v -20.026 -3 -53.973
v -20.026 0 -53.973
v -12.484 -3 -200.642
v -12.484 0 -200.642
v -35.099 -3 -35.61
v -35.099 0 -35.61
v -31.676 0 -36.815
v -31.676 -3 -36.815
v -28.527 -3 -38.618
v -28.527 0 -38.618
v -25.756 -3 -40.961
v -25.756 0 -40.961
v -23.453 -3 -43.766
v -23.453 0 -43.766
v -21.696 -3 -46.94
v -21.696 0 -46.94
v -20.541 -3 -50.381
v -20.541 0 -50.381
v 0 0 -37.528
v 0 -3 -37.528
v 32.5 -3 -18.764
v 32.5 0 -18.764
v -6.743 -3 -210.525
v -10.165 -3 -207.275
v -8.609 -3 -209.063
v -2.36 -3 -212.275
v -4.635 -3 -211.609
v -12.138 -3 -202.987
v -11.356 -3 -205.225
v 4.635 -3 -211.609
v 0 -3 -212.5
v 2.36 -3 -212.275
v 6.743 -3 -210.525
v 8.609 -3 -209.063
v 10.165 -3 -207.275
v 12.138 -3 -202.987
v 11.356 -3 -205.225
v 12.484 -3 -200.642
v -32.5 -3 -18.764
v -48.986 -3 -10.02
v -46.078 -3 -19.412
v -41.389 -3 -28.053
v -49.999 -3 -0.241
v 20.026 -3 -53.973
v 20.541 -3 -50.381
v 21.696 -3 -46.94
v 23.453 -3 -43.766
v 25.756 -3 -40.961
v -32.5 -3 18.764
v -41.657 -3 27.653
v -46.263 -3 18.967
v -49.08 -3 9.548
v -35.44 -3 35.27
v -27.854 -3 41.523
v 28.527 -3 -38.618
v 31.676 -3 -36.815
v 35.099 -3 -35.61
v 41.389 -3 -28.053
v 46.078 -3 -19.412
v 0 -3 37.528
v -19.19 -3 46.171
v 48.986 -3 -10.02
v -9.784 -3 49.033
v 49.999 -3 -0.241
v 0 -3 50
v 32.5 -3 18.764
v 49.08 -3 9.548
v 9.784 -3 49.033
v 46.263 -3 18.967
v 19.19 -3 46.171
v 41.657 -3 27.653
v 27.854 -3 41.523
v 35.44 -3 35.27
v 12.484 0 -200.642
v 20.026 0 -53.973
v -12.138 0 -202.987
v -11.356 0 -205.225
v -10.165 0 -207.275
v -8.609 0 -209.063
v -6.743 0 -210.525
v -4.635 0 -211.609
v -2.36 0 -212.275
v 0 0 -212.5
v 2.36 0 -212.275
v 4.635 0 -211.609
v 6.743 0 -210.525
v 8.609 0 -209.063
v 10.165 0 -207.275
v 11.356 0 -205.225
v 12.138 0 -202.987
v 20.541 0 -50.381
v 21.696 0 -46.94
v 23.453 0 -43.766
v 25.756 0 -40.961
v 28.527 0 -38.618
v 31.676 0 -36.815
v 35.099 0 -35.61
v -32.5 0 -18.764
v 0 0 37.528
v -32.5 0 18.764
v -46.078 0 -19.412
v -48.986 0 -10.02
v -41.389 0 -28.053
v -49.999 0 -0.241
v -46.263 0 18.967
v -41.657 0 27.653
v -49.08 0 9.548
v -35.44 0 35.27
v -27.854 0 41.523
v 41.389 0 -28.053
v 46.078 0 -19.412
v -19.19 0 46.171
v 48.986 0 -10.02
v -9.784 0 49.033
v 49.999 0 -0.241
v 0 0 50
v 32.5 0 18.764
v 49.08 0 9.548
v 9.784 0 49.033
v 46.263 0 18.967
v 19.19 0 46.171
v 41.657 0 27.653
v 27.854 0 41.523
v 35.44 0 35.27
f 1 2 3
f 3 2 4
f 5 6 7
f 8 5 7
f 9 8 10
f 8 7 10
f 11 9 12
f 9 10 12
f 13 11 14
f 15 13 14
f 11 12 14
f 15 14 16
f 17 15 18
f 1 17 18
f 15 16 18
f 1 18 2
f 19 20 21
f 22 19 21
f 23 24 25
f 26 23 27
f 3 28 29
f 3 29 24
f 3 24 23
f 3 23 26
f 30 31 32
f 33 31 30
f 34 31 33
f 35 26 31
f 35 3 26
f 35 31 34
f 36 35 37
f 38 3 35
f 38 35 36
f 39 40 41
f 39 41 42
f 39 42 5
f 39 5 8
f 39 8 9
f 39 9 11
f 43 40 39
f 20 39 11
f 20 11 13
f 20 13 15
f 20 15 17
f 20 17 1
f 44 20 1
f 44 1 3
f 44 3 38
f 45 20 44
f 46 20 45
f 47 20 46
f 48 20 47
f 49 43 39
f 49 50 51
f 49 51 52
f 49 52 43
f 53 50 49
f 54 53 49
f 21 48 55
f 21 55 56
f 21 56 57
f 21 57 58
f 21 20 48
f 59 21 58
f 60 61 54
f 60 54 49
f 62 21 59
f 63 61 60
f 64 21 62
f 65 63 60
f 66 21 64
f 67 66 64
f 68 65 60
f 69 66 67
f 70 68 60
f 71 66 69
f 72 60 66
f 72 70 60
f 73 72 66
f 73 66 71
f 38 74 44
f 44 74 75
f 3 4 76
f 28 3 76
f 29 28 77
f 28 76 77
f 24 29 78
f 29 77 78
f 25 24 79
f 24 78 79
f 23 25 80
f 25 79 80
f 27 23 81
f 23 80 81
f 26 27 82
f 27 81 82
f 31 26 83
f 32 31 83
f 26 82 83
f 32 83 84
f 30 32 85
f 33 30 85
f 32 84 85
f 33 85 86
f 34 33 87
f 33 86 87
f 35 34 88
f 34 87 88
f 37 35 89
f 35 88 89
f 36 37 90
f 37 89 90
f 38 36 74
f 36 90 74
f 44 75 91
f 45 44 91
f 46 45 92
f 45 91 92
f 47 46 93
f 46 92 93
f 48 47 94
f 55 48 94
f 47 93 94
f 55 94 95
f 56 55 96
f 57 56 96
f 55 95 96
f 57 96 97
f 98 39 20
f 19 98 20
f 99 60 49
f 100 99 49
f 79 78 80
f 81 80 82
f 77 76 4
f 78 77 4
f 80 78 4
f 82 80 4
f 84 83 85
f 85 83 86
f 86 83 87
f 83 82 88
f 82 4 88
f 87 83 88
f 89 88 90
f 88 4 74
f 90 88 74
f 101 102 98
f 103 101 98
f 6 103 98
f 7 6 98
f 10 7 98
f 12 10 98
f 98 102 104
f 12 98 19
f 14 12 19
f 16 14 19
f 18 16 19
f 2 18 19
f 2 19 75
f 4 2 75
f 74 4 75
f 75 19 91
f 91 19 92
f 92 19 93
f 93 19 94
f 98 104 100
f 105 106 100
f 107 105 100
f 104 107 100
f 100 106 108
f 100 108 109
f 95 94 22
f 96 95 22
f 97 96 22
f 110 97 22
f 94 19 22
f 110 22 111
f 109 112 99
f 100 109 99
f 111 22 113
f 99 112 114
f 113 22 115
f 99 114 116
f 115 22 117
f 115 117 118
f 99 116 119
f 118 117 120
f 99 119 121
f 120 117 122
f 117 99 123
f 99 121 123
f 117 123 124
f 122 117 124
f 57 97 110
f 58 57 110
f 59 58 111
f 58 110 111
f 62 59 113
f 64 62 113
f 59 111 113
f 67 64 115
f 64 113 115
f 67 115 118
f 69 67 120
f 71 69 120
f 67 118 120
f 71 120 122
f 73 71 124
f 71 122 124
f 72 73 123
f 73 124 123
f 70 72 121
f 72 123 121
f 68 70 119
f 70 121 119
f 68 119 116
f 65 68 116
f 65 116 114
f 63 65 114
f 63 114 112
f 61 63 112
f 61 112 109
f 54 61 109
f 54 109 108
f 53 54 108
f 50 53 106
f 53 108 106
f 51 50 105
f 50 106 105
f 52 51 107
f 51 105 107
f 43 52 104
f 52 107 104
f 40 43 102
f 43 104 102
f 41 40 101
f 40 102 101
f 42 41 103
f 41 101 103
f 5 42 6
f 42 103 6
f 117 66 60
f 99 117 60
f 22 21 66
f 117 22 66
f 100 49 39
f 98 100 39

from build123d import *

# Parameters (mm, degrees)
F1_DEPTH = 3
F3_DEPTH = 25


with BuildPart() as f1:
    # F0 (on Front) → F1 (new body)
    with BuildSketch(Plane.XZ):
        with BuildLine():
            ThreePointArc((20.026396, -53.972799), (24.540831, -42.310868), (35.099057, -35.609777))
            ThreePointArc((35.099057, -35.609777), (0, 50), (-35.099057, -35.609777))
            ThreePointArc((-35.099057, -35.609777), (-24.540831, -42.310868), (-20.026396, -53.972799))
            Line((-20.026396, -53.972799), (-12.483503, -200.642001))
            ThreePointArc((-12.483503, -200.642001), (0, -212.5), (12.483503, -200.642001))
            Line((12.483503, -200.642001), (20.026396, -53.972799))
        make_face()
    extrude(amount=F1_DEPTH)

    # F2 (on face) → F3 (cut)
    with BuildSketch(Plane.XZ.offset(3)):
        Polygon((-32.5, 18.763884), (-32.5, -18.763884), (0, -37.527767), (32.5, -18.763884), (32.5, 18.763884), (0, 37.527767), align=None)
    extrude(amount=-F3_DEPTH, mode=Mode.SUBTRACT)


solid = f1.part
